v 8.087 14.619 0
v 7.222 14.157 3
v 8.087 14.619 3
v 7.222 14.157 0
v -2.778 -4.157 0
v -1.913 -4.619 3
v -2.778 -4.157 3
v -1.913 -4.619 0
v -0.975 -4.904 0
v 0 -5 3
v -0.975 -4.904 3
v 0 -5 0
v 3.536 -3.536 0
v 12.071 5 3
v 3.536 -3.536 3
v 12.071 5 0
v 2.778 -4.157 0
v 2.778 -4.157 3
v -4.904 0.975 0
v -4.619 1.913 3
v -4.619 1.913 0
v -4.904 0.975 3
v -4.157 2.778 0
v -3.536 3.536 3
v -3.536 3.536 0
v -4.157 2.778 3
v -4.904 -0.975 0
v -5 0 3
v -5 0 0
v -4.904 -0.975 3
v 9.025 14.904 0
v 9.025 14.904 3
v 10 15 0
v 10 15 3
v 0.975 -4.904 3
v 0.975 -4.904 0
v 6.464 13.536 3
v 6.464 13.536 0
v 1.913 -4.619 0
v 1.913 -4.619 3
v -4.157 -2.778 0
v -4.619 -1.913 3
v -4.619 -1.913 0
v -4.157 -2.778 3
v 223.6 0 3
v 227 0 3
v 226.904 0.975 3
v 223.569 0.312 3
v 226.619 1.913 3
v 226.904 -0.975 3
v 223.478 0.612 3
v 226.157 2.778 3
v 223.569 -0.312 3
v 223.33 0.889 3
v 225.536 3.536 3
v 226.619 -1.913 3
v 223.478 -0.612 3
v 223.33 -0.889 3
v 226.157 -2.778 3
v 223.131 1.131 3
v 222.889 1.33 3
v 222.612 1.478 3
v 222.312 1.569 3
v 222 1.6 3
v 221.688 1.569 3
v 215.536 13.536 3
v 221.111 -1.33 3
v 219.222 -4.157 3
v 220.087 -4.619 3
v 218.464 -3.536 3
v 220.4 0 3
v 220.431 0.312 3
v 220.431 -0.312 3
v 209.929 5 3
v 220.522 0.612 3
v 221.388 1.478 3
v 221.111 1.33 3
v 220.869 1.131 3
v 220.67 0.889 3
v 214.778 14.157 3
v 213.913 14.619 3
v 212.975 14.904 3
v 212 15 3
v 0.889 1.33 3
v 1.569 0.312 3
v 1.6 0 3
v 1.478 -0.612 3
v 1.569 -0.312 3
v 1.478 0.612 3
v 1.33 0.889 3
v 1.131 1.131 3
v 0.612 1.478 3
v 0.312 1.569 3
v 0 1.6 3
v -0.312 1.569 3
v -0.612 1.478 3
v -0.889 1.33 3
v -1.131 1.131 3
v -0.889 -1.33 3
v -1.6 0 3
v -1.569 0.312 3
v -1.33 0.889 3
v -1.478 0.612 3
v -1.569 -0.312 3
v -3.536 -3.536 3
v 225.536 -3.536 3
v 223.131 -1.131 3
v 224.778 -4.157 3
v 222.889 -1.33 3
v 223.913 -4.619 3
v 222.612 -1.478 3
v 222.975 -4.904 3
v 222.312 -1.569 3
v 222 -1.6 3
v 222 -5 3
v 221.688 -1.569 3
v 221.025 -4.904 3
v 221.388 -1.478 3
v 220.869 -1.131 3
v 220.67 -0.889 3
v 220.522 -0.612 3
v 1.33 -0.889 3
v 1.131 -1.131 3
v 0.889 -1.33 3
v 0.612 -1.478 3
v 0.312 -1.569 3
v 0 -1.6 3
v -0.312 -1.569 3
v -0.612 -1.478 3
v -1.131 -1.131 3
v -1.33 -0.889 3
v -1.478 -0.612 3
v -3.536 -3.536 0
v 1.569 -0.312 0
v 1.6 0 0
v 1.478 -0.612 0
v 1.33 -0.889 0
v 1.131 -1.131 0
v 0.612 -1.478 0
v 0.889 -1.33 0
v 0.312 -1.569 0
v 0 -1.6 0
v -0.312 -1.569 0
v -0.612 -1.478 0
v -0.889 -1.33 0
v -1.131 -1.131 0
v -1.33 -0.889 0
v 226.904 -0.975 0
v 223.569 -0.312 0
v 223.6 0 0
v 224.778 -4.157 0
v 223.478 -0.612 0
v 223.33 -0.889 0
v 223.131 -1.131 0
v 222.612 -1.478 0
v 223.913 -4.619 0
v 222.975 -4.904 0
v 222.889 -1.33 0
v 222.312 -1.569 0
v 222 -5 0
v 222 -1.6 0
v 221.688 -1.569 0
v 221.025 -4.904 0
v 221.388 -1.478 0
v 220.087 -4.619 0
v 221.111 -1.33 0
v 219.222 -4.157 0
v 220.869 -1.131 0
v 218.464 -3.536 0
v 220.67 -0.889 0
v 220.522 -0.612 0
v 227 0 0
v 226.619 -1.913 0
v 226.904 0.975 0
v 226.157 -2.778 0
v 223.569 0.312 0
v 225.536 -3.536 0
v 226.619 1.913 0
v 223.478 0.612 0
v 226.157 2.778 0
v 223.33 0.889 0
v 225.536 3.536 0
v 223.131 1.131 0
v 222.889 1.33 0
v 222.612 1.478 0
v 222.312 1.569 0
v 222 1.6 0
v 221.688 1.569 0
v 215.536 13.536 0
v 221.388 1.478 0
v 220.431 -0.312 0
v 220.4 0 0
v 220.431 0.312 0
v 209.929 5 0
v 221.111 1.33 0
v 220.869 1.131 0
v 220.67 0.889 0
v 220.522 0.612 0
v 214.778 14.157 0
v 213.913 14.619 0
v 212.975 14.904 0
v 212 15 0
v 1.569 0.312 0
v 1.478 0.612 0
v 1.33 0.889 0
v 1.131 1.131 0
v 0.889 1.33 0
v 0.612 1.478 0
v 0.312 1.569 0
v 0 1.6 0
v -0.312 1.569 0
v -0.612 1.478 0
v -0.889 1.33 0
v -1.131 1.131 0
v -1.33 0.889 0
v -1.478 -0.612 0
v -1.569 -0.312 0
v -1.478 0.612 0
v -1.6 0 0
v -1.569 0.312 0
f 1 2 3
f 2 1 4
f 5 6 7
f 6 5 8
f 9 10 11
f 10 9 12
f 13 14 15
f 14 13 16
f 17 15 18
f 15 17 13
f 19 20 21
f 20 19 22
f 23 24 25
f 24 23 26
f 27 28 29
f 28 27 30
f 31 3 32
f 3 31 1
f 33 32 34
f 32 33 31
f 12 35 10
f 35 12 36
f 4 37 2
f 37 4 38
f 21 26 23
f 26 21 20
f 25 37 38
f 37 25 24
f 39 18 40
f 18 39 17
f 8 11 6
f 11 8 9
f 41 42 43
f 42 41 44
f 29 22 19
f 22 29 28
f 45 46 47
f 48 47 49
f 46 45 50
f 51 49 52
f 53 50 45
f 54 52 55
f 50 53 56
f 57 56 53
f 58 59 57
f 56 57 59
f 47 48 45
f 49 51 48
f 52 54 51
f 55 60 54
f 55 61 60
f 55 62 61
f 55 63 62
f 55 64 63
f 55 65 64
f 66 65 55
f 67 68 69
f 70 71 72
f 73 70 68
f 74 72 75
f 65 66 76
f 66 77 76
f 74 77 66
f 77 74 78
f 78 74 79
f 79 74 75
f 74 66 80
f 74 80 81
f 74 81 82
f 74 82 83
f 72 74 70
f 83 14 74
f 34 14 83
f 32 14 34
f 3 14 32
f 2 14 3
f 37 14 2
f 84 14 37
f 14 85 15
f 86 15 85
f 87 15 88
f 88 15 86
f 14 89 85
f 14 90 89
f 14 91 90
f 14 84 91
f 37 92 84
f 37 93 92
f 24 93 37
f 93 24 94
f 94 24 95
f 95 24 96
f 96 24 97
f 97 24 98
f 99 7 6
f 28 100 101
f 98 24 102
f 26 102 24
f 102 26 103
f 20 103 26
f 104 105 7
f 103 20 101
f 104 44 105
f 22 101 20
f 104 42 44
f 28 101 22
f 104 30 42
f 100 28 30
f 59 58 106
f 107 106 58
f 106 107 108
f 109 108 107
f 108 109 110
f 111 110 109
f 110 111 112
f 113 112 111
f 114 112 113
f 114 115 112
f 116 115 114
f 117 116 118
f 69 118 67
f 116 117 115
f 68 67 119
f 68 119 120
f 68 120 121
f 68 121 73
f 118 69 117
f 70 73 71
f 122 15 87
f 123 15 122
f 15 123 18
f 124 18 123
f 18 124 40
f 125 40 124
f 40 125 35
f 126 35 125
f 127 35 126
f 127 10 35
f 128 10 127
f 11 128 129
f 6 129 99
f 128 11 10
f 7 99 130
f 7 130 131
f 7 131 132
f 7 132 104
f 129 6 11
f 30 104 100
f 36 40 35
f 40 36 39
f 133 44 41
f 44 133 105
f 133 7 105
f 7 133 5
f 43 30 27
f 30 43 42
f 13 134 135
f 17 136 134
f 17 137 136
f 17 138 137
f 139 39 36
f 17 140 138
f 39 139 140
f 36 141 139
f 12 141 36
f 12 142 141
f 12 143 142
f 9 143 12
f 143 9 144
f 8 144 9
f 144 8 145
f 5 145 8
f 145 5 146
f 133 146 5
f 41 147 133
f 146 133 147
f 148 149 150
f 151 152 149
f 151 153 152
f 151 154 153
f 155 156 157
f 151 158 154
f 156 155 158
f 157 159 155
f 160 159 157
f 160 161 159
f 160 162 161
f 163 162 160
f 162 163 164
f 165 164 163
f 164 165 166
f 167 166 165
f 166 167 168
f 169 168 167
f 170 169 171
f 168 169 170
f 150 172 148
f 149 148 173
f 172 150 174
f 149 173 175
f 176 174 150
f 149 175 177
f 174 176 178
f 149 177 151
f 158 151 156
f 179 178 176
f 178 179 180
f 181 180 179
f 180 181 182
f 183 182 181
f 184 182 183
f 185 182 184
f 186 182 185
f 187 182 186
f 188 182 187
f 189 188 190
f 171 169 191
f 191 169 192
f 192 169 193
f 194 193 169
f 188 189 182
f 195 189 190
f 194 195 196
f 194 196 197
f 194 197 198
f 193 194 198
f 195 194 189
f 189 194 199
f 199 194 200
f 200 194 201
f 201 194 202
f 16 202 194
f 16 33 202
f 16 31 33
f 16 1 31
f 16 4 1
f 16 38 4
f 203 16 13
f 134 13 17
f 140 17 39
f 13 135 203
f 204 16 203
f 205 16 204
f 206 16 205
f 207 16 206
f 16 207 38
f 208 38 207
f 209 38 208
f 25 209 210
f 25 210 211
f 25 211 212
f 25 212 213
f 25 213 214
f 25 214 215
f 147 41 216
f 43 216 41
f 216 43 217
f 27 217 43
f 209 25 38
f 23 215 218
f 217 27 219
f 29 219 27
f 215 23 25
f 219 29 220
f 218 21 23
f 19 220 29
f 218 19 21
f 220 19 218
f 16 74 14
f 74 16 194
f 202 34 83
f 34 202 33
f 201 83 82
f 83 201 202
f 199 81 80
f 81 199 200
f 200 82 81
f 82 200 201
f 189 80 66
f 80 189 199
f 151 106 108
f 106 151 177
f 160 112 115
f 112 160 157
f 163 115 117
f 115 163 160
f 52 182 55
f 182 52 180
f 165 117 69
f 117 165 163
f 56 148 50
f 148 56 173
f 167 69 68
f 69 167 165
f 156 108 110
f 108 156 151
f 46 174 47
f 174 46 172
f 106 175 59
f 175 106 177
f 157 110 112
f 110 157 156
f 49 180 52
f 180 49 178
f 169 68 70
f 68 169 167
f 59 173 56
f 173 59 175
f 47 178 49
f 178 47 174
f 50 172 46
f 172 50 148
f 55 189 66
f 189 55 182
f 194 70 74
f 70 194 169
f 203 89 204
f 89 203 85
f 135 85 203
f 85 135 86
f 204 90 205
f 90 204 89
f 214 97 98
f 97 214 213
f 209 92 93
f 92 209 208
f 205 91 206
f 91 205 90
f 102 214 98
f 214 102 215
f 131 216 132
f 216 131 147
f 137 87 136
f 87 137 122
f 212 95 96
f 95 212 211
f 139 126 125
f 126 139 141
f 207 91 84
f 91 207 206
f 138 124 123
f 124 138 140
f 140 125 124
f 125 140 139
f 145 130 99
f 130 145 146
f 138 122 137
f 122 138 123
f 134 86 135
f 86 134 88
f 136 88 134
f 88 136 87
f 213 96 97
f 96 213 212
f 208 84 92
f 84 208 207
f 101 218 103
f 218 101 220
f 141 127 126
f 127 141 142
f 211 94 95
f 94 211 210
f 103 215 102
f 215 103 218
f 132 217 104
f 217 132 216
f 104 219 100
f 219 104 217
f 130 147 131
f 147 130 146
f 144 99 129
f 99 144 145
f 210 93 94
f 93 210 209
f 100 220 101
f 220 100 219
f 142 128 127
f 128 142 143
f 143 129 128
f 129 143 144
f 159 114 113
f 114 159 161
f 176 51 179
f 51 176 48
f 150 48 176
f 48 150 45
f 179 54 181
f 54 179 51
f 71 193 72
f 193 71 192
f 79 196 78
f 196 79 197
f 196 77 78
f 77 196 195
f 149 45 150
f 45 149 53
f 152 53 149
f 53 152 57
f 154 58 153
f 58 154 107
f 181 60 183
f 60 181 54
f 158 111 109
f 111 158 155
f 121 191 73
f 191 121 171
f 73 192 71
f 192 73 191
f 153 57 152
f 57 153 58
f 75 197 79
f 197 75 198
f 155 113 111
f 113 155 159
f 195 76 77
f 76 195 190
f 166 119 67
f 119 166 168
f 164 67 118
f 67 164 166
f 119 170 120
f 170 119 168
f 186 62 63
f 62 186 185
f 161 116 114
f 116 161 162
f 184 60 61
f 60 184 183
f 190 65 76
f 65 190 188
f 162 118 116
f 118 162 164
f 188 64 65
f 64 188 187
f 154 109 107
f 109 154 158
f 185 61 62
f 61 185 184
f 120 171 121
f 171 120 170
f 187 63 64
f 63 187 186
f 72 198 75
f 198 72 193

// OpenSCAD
//EuroCardDwarsBaseMulti5

guideCount = 7;

module beugel() {
    translate([0, -beugelbreedte/2, 0]) cube([beugellengte, beugelbreedte, beugeldikte]);
    cylinder(d = beugelbreedte, h = beugeldikte);
    translate([beugelDist, 0, 0]) cylinder(d = beugelbreedte, h = beugeldikte);
}

$fn = 32;

//beugellengte = 122.0;
beugellengte = 72.0 + 25.0 * (guideCount-1);
beugelbreedte = 10.0;
beugeldikte = 3.0;

//beugelDist = 122.0;
beugelDist = beugellengte;

module beugel2() {
    hull() {
        cylinder(d = beugelbreedte, h = beugeldikte);
        translate([beugelbreedte, beugelbreedte, 0]) cylinder(d = beugelbreedte, h = beugeldikte);
    }
    hull() {
        translate([beugelbreedte, beugelbreedte, 0]) cylinder(d = beugelbreedte, h = beugeldikte);
        translate([beugellengte - beugelbreedte, beugelbreedte, 0]) cylinder(d = beugelbreedte, h = beugeldikte);
    }
    hull() {
        translate([beugellengte - beugelbreedte, beugelbreedte, 0]) cylinder(d = beugelbreedte, h = beugeldikte);
        translate([beugelDist, 0, 0]) cylinder(d = beugelbreedte, h = beugeldikte);
    }
}

difference() {
    beugel2();
    translate([0, 0, -0.01]) cylinder(d = 3.2, h = beugeldikte + 0.02);
    translate([beugelDist, 0, -0.01]) cylinder(d = 3.2, h = beugeldikte + 0.02);
}

// for visual testing
//translate([0, 0, -1]) color("red") cube([beugelDist, 2, 2]);
